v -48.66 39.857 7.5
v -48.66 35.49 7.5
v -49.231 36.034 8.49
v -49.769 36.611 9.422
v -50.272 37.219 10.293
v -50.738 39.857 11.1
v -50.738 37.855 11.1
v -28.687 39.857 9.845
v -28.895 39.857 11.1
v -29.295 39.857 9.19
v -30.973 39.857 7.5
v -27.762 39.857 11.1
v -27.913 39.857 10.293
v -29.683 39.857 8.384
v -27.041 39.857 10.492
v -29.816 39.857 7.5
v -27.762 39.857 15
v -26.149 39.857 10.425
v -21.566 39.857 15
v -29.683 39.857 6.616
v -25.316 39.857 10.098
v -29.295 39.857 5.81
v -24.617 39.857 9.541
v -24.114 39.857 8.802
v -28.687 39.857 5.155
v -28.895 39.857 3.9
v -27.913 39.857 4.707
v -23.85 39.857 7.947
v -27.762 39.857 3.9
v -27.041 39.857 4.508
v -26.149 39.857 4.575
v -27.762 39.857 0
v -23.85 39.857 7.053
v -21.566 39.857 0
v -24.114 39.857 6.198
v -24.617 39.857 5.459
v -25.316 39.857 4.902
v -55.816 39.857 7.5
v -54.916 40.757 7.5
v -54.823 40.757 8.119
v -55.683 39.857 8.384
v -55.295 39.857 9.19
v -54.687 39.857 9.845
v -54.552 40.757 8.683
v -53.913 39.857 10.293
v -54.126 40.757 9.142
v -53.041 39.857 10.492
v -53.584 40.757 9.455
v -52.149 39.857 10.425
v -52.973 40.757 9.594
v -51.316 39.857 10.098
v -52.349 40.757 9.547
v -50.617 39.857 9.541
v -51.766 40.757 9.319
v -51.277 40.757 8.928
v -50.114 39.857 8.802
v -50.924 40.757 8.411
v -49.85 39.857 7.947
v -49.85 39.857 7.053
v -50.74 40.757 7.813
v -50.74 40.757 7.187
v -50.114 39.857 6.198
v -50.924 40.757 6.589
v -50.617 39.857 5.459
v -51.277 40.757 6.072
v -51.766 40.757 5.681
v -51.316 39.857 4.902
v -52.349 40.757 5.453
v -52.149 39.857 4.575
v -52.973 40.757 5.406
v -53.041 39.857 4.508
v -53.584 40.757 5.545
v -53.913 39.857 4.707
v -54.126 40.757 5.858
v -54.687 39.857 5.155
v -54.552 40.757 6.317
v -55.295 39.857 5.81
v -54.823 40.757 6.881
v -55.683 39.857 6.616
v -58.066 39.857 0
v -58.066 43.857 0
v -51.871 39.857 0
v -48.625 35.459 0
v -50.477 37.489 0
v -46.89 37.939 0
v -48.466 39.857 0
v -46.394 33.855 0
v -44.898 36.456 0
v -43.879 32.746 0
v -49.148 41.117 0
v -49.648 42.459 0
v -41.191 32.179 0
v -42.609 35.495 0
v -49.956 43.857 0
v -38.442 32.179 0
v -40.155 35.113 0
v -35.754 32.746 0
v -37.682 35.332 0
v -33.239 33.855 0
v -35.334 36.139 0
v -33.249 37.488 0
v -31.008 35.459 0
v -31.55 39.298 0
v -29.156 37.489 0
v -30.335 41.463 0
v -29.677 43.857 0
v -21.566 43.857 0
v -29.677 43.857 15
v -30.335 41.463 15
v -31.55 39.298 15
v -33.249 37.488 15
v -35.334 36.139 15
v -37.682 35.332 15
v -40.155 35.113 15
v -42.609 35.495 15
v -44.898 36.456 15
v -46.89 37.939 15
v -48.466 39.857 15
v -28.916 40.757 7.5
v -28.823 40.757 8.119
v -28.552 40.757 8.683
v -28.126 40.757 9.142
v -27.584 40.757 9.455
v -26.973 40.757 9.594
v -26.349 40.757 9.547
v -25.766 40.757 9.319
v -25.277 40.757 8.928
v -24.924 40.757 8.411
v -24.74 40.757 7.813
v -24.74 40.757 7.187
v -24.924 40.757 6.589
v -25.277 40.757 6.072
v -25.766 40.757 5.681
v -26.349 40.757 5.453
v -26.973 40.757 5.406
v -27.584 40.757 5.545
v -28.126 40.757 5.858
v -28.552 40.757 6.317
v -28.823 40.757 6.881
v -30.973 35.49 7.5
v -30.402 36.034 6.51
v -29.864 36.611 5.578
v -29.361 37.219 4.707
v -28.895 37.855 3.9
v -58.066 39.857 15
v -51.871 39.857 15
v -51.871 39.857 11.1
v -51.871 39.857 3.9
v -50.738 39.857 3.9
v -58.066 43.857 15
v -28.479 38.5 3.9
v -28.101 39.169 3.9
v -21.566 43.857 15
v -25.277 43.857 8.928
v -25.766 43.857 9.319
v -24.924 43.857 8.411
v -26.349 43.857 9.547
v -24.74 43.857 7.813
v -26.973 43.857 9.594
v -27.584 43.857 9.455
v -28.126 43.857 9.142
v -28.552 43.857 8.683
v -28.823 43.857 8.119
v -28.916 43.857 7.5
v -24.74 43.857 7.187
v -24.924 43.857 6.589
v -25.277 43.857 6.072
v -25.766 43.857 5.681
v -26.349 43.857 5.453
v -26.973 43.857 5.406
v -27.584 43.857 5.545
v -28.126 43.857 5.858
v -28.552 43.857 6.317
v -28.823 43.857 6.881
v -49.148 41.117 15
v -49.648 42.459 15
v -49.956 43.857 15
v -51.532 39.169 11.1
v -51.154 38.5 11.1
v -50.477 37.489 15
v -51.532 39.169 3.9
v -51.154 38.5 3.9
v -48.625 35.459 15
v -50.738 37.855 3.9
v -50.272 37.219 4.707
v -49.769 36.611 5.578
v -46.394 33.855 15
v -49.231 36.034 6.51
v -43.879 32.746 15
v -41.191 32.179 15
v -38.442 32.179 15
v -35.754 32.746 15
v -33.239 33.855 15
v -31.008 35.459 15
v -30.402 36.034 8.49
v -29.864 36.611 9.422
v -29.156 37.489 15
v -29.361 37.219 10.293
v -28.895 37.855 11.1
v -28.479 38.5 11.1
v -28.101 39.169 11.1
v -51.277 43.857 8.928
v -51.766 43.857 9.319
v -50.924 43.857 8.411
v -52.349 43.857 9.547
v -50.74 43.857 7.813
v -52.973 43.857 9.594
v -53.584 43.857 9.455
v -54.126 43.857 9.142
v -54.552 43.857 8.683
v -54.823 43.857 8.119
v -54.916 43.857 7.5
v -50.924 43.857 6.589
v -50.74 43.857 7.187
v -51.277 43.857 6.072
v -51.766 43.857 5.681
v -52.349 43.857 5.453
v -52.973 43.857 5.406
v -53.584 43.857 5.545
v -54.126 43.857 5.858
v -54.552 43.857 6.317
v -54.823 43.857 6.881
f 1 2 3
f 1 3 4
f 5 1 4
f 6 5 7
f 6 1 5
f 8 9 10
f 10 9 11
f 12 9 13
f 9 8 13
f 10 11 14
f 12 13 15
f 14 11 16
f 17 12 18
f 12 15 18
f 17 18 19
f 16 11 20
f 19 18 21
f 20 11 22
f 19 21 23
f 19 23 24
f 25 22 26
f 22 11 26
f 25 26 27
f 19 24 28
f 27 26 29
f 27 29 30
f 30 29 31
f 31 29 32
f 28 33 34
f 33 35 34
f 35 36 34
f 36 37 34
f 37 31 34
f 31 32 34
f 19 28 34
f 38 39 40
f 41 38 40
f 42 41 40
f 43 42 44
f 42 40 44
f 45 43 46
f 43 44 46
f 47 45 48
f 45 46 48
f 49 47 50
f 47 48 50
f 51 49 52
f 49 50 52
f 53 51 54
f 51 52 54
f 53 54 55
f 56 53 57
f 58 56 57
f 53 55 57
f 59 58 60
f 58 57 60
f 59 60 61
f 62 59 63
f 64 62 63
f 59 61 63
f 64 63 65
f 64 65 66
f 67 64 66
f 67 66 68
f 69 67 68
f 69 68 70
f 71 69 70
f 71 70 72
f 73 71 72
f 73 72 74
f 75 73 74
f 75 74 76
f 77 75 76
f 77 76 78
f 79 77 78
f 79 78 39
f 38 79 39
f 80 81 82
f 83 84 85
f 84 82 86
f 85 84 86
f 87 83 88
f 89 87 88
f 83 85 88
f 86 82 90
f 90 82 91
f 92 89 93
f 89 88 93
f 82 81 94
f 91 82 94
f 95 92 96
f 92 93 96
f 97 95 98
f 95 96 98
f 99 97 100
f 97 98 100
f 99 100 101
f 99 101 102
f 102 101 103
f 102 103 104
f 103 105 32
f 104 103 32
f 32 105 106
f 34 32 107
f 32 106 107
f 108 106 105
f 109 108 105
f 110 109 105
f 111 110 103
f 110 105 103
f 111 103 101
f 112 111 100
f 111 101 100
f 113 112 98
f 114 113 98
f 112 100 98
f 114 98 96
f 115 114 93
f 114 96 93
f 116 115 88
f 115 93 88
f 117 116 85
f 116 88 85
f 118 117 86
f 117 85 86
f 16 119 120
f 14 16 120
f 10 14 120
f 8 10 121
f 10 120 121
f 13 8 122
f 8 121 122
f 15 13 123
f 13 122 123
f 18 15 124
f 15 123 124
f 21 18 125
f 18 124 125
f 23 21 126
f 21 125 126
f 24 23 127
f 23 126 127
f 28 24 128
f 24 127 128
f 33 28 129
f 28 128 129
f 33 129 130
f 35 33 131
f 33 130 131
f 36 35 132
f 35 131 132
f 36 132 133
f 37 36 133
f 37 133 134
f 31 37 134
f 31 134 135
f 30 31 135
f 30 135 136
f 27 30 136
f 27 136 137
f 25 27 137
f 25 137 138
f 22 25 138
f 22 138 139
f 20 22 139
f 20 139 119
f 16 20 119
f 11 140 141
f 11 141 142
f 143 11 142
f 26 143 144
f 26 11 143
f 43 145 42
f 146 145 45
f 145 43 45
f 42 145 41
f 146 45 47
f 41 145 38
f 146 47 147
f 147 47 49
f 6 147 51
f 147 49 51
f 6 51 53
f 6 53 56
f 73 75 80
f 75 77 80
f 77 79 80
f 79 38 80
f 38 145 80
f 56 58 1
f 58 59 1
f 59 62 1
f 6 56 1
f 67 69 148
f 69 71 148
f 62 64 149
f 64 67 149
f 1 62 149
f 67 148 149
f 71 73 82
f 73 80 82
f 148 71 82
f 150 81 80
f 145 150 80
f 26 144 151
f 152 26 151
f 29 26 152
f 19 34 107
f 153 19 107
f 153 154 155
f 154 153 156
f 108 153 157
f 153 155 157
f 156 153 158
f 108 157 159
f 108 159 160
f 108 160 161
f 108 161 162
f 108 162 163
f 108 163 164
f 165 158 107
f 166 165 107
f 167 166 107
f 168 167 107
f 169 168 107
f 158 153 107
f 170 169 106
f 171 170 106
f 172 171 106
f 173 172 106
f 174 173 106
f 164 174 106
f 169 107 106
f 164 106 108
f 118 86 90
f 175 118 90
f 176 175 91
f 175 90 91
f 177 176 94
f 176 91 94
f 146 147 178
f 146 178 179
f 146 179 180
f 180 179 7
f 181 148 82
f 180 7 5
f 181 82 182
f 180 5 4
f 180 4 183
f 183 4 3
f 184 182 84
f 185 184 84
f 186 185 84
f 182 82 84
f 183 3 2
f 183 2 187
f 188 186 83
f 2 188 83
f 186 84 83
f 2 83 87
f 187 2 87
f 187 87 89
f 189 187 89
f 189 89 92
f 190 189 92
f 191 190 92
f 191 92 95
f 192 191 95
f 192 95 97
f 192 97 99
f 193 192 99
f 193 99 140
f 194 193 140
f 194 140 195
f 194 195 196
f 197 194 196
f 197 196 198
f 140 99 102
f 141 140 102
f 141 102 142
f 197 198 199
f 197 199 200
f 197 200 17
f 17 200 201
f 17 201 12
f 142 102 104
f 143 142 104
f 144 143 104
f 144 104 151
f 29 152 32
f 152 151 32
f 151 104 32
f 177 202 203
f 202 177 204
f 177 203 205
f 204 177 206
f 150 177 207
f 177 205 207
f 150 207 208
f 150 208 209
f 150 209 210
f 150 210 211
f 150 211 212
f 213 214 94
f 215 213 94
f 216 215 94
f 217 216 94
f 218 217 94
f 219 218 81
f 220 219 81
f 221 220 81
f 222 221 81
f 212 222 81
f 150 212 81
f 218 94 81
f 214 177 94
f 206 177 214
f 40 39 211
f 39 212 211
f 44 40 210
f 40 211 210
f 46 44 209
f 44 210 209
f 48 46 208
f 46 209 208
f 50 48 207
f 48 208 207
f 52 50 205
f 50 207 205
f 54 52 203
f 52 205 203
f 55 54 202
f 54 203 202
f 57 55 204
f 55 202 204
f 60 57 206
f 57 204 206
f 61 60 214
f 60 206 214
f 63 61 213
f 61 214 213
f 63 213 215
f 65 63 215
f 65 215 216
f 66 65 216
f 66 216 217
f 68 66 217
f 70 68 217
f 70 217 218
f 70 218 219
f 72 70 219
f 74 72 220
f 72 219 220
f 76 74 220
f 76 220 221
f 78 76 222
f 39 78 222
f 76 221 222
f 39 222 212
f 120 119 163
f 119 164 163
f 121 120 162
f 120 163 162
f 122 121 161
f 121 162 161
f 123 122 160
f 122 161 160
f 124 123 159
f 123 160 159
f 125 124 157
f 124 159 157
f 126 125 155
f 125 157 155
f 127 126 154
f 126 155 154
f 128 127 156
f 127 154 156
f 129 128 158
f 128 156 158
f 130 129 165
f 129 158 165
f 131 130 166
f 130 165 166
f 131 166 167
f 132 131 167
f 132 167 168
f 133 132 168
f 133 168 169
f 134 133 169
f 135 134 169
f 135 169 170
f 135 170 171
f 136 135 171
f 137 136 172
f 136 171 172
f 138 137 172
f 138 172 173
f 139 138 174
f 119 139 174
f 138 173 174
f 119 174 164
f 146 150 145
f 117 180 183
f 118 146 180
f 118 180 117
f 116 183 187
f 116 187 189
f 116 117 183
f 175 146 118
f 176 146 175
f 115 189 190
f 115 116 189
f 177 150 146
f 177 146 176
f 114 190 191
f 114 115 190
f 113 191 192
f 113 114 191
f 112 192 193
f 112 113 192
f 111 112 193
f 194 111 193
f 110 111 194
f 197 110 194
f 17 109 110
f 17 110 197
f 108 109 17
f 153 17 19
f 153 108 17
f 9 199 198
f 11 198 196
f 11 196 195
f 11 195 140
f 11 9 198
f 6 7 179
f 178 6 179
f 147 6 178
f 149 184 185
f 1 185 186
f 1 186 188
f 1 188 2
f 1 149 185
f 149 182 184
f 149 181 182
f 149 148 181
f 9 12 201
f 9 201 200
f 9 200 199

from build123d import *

# Parameters (mm, degrees)
F1_DEPTH       = 15
F3_D           = 4.2
F3_DEPTH       = 10
F3_CSINK_D     = 6
F3_CSINK_ANGLE = 90
F3_TIP         = 1.2618073
F4_DEPTH       = 25


with BuildPart() as f1:
    # F0 (on Top) → F1 (new body)
    with BuildSketch(Plane.XY):
        with BuildLine():
            ThreePointArc((-48.4659095265, 39.8574409581), (-49.4215542208, 41.7790062675), (-49.9561374759, 43.8574409581))
            Line((-49.9561374759, 43.8574409581), (-52.9813081262, 43.8574409581))
            ThreePointArc((-52.9813081262, 43.8574409581), (-52.58380258, 41.8136904443), (-51.8710510318, 39.8574409581))
            Line((-51.8710510318, 39.8574409581), (-48.4659095265, 39.8574409581))
        make_face()
        with BuildLine():
            ThreePointArc((-51.8710510318, 39.8574409581), (-52.58380258, 41.8136904443), (-52.9813081262, 43.8574409581))
            Line((-52.9813081262, 43.8574409581), (-58.0664875805, 43.8574409581))
            Line((-58.0664875805, 43.8574409581), (-58.0664875805, 39.8574409581))
            Line((-58.0664875805, 39.8574409581), (-51.8710510318, 39.8574409581))
        make_face()
        with BuildLine():
            Line((-21.5664875805, 43.8574409581), (-26.6516670349, 43.8574409581))
            ThreePointArc((-26.6516670349, 43.8574409581), (-27.0491725811, 41.8136904443), (-27.7619241293, 39.8574409581))
            Line((-27.7619241293, 39.8574409581), (-21.5664875805, 39.8574409581))
            Line((-21.5664875805, 39.8574409581), (-21.5664875805, 43.8574409581))
        make_face()
        with BuildLine():
            ThreePointArc((-29.6768376852, 43.8574409581), (-37.682197339, 35.3321077883), (-48.4659095265, 39.8574409581))
            Line((-48.4659095265, 39.8574409581), (-51.8710510318, 39.8574409581))
            ThreePointArc((-51.8710510318, 39.8574409581), (-39.8164875805, 32.1074409581), (-27.7619241293, 39.8574409581))
            ThreePointArc((-27.7619241293, 39.8574409581), (-27.0491725811, 41.8136904443), (-26.6516670349, 43.8574409581))
            Line((-26.6516670349, 43.8574409581), (-29.6768376852, 43.8574409581))
        make_face()
    extrude(amount=F1_DEPTH)

    # F3
    with Locations(Plane.XZ.offset(-39.8574409581)):
        with Locations((-52.8164875805, 7.5), (-26.8164875805, 7.5)):
            CounterSinkHole(F3_D / 2, F3_CSINK_D / 2, depth=F3_DEPTH, counter_sink_angle=F3_CSINK_ANGLE)
            with Locations((0, 0, -(F3_DEPTH + F3_TIP / 2))):  # 118° drill point
                Cone(0, F3_D / 2, F3_TIP, mode=Mode.SUBTRACT)

    # F2 (on face) → F4 (cut)
    with BuildSketch(Plane.XZ.offset(-39.8574409581)):
        Polygon((-54.8949485496, 3.9), (-50.7380266115, 3.9), (-48.6595656424, 7.5), (-50.7380266115, 11.1), (-54.8949485496, 11.1), (-56.9734095187, 7.5), align=None)
        Polygon((-28.8949485496, 3.9), (-24.7380266115, 3.9), (-22.6595656424, 7.5), (-24.7380266115, 11.1), (-28.8949485496, 11.1), (-30.9734095187, 7.5), align=None)
    extrude(amount=F4_DEPTH, mode=Mode.SUBTRACT)


solid = f1.part
